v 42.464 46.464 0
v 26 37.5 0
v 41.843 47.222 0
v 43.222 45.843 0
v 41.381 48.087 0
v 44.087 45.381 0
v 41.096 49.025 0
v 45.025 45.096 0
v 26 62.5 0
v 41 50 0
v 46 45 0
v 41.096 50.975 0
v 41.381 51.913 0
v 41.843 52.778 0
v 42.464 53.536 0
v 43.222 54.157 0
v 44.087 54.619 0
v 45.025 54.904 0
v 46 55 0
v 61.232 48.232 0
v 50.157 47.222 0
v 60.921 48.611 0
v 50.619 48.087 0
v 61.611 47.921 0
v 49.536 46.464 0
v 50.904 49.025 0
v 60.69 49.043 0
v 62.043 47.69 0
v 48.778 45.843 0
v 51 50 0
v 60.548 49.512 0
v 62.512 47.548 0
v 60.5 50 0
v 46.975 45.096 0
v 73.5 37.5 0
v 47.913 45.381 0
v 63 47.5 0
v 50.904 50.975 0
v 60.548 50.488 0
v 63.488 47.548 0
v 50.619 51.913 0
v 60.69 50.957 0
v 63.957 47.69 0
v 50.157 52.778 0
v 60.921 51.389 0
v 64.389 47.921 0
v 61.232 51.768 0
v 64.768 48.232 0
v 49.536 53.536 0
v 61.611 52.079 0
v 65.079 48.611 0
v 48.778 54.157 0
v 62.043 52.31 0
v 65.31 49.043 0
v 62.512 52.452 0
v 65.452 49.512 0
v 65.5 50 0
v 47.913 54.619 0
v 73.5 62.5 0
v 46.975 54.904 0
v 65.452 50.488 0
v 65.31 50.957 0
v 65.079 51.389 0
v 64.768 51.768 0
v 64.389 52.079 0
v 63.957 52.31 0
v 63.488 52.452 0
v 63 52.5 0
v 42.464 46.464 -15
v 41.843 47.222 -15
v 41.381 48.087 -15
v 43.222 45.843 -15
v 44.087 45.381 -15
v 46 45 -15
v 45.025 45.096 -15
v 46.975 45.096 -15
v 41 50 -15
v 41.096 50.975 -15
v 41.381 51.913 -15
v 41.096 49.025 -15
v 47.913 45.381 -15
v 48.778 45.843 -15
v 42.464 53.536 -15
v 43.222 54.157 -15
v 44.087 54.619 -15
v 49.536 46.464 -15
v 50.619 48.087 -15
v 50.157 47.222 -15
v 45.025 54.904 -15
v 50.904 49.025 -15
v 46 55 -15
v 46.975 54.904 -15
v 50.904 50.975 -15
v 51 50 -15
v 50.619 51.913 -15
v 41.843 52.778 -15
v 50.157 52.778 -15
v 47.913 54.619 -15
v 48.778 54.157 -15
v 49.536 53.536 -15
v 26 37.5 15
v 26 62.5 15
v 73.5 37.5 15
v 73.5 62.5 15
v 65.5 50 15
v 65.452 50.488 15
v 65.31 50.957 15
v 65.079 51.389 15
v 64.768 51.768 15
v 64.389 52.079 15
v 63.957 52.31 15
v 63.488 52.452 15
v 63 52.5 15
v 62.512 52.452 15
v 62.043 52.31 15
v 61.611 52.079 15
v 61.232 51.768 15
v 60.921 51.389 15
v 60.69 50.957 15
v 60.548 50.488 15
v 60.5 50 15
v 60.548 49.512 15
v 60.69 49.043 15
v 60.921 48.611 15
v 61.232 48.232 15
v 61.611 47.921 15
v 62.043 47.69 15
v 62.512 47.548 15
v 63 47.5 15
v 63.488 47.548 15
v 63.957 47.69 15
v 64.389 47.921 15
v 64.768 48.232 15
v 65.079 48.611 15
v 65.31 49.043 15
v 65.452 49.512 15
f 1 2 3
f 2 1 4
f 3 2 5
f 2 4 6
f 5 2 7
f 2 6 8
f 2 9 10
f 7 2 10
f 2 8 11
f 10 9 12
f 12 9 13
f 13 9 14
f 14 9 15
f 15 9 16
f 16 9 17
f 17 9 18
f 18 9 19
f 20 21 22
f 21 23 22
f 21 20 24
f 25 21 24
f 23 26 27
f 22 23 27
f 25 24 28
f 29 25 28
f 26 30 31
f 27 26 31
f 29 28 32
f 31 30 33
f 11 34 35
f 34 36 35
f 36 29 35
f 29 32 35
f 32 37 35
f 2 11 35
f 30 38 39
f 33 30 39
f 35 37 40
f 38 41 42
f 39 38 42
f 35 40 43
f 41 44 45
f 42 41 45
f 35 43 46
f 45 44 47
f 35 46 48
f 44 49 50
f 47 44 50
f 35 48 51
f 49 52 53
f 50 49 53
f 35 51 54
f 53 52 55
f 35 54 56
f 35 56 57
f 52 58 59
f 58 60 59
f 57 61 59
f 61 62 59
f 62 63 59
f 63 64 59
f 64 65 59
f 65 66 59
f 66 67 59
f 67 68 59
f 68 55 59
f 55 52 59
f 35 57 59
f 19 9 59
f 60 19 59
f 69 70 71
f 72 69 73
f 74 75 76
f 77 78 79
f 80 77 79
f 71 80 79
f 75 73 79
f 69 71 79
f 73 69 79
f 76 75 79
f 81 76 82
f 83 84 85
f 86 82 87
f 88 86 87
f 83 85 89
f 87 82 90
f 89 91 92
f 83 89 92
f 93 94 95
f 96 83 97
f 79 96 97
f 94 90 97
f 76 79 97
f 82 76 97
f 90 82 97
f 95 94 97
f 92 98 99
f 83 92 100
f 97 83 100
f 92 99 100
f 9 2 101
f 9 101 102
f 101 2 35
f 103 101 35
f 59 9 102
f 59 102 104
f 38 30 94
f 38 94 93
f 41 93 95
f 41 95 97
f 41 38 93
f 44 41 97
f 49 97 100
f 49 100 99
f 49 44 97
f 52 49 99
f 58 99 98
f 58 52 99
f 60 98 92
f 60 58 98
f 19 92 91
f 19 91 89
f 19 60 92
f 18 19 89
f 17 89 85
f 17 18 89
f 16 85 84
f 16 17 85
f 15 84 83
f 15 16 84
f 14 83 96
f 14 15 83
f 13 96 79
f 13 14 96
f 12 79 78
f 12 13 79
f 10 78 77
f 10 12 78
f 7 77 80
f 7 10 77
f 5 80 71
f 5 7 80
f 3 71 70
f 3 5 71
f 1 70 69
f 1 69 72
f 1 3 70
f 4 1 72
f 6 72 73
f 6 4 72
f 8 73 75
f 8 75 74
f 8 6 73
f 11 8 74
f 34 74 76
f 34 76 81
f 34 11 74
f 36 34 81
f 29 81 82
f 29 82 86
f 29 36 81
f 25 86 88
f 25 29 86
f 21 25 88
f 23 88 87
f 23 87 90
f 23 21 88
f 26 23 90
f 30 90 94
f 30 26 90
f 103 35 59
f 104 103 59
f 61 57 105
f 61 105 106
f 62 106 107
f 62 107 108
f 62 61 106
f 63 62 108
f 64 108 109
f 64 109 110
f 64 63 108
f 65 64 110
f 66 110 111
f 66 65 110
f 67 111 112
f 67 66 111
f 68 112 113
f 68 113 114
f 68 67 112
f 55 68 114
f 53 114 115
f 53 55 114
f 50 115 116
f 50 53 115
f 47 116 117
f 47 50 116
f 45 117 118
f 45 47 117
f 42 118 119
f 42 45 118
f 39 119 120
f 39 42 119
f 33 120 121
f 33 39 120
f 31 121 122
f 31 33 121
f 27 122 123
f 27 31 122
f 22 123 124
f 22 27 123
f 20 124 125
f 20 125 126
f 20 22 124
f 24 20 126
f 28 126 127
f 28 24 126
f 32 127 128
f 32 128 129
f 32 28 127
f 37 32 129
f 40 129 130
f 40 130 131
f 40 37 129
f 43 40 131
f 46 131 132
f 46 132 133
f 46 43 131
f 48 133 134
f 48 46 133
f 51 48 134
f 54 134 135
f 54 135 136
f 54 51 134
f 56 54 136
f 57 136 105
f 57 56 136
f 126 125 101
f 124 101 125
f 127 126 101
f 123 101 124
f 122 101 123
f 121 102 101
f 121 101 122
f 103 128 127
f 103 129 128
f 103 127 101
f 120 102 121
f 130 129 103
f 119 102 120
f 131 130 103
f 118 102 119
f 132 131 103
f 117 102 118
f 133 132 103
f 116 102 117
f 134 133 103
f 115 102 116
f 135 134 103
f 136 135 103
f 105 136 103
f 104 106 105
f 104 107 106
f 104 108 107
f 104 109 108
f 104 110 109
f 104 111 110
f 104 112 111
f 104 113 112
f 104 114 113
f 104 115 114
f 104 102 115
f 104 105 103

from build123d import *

# Parameters (mm, degrees)
F0_W     = 47.5
F0_H     = 25
F0_R     = 5
F0_R_2   = 2.5
F1_DEPTH = 15
F2_DEPTH = 15


with BuildPart() as f1:
    # F0 (on Top) → F1 (new body)
    with BuildSketch(Plane.XY):
        with Locations((49.75, 50)):
            Rectangle(F0_W, F0_H)
        with Locations((46, 50)):
            Circle(F0_R, mode=Mode.SUBTRACT)
        with Locations((63, 50)):
            Circle(F0_R_2, mode=Mode.SUBTRACT)
        with Locations((46, 50)):
            Circle(F0_R)
    extrude(amount=F1_DEPTH)

    # F0 (on Top) → F2 (join)
    with BuildSketch(Plane.XY):
        with Locations((46, 50)):
            Circle(F0_R)
    extrude(amount=-F2_DEPTH)


solid = f1.part
